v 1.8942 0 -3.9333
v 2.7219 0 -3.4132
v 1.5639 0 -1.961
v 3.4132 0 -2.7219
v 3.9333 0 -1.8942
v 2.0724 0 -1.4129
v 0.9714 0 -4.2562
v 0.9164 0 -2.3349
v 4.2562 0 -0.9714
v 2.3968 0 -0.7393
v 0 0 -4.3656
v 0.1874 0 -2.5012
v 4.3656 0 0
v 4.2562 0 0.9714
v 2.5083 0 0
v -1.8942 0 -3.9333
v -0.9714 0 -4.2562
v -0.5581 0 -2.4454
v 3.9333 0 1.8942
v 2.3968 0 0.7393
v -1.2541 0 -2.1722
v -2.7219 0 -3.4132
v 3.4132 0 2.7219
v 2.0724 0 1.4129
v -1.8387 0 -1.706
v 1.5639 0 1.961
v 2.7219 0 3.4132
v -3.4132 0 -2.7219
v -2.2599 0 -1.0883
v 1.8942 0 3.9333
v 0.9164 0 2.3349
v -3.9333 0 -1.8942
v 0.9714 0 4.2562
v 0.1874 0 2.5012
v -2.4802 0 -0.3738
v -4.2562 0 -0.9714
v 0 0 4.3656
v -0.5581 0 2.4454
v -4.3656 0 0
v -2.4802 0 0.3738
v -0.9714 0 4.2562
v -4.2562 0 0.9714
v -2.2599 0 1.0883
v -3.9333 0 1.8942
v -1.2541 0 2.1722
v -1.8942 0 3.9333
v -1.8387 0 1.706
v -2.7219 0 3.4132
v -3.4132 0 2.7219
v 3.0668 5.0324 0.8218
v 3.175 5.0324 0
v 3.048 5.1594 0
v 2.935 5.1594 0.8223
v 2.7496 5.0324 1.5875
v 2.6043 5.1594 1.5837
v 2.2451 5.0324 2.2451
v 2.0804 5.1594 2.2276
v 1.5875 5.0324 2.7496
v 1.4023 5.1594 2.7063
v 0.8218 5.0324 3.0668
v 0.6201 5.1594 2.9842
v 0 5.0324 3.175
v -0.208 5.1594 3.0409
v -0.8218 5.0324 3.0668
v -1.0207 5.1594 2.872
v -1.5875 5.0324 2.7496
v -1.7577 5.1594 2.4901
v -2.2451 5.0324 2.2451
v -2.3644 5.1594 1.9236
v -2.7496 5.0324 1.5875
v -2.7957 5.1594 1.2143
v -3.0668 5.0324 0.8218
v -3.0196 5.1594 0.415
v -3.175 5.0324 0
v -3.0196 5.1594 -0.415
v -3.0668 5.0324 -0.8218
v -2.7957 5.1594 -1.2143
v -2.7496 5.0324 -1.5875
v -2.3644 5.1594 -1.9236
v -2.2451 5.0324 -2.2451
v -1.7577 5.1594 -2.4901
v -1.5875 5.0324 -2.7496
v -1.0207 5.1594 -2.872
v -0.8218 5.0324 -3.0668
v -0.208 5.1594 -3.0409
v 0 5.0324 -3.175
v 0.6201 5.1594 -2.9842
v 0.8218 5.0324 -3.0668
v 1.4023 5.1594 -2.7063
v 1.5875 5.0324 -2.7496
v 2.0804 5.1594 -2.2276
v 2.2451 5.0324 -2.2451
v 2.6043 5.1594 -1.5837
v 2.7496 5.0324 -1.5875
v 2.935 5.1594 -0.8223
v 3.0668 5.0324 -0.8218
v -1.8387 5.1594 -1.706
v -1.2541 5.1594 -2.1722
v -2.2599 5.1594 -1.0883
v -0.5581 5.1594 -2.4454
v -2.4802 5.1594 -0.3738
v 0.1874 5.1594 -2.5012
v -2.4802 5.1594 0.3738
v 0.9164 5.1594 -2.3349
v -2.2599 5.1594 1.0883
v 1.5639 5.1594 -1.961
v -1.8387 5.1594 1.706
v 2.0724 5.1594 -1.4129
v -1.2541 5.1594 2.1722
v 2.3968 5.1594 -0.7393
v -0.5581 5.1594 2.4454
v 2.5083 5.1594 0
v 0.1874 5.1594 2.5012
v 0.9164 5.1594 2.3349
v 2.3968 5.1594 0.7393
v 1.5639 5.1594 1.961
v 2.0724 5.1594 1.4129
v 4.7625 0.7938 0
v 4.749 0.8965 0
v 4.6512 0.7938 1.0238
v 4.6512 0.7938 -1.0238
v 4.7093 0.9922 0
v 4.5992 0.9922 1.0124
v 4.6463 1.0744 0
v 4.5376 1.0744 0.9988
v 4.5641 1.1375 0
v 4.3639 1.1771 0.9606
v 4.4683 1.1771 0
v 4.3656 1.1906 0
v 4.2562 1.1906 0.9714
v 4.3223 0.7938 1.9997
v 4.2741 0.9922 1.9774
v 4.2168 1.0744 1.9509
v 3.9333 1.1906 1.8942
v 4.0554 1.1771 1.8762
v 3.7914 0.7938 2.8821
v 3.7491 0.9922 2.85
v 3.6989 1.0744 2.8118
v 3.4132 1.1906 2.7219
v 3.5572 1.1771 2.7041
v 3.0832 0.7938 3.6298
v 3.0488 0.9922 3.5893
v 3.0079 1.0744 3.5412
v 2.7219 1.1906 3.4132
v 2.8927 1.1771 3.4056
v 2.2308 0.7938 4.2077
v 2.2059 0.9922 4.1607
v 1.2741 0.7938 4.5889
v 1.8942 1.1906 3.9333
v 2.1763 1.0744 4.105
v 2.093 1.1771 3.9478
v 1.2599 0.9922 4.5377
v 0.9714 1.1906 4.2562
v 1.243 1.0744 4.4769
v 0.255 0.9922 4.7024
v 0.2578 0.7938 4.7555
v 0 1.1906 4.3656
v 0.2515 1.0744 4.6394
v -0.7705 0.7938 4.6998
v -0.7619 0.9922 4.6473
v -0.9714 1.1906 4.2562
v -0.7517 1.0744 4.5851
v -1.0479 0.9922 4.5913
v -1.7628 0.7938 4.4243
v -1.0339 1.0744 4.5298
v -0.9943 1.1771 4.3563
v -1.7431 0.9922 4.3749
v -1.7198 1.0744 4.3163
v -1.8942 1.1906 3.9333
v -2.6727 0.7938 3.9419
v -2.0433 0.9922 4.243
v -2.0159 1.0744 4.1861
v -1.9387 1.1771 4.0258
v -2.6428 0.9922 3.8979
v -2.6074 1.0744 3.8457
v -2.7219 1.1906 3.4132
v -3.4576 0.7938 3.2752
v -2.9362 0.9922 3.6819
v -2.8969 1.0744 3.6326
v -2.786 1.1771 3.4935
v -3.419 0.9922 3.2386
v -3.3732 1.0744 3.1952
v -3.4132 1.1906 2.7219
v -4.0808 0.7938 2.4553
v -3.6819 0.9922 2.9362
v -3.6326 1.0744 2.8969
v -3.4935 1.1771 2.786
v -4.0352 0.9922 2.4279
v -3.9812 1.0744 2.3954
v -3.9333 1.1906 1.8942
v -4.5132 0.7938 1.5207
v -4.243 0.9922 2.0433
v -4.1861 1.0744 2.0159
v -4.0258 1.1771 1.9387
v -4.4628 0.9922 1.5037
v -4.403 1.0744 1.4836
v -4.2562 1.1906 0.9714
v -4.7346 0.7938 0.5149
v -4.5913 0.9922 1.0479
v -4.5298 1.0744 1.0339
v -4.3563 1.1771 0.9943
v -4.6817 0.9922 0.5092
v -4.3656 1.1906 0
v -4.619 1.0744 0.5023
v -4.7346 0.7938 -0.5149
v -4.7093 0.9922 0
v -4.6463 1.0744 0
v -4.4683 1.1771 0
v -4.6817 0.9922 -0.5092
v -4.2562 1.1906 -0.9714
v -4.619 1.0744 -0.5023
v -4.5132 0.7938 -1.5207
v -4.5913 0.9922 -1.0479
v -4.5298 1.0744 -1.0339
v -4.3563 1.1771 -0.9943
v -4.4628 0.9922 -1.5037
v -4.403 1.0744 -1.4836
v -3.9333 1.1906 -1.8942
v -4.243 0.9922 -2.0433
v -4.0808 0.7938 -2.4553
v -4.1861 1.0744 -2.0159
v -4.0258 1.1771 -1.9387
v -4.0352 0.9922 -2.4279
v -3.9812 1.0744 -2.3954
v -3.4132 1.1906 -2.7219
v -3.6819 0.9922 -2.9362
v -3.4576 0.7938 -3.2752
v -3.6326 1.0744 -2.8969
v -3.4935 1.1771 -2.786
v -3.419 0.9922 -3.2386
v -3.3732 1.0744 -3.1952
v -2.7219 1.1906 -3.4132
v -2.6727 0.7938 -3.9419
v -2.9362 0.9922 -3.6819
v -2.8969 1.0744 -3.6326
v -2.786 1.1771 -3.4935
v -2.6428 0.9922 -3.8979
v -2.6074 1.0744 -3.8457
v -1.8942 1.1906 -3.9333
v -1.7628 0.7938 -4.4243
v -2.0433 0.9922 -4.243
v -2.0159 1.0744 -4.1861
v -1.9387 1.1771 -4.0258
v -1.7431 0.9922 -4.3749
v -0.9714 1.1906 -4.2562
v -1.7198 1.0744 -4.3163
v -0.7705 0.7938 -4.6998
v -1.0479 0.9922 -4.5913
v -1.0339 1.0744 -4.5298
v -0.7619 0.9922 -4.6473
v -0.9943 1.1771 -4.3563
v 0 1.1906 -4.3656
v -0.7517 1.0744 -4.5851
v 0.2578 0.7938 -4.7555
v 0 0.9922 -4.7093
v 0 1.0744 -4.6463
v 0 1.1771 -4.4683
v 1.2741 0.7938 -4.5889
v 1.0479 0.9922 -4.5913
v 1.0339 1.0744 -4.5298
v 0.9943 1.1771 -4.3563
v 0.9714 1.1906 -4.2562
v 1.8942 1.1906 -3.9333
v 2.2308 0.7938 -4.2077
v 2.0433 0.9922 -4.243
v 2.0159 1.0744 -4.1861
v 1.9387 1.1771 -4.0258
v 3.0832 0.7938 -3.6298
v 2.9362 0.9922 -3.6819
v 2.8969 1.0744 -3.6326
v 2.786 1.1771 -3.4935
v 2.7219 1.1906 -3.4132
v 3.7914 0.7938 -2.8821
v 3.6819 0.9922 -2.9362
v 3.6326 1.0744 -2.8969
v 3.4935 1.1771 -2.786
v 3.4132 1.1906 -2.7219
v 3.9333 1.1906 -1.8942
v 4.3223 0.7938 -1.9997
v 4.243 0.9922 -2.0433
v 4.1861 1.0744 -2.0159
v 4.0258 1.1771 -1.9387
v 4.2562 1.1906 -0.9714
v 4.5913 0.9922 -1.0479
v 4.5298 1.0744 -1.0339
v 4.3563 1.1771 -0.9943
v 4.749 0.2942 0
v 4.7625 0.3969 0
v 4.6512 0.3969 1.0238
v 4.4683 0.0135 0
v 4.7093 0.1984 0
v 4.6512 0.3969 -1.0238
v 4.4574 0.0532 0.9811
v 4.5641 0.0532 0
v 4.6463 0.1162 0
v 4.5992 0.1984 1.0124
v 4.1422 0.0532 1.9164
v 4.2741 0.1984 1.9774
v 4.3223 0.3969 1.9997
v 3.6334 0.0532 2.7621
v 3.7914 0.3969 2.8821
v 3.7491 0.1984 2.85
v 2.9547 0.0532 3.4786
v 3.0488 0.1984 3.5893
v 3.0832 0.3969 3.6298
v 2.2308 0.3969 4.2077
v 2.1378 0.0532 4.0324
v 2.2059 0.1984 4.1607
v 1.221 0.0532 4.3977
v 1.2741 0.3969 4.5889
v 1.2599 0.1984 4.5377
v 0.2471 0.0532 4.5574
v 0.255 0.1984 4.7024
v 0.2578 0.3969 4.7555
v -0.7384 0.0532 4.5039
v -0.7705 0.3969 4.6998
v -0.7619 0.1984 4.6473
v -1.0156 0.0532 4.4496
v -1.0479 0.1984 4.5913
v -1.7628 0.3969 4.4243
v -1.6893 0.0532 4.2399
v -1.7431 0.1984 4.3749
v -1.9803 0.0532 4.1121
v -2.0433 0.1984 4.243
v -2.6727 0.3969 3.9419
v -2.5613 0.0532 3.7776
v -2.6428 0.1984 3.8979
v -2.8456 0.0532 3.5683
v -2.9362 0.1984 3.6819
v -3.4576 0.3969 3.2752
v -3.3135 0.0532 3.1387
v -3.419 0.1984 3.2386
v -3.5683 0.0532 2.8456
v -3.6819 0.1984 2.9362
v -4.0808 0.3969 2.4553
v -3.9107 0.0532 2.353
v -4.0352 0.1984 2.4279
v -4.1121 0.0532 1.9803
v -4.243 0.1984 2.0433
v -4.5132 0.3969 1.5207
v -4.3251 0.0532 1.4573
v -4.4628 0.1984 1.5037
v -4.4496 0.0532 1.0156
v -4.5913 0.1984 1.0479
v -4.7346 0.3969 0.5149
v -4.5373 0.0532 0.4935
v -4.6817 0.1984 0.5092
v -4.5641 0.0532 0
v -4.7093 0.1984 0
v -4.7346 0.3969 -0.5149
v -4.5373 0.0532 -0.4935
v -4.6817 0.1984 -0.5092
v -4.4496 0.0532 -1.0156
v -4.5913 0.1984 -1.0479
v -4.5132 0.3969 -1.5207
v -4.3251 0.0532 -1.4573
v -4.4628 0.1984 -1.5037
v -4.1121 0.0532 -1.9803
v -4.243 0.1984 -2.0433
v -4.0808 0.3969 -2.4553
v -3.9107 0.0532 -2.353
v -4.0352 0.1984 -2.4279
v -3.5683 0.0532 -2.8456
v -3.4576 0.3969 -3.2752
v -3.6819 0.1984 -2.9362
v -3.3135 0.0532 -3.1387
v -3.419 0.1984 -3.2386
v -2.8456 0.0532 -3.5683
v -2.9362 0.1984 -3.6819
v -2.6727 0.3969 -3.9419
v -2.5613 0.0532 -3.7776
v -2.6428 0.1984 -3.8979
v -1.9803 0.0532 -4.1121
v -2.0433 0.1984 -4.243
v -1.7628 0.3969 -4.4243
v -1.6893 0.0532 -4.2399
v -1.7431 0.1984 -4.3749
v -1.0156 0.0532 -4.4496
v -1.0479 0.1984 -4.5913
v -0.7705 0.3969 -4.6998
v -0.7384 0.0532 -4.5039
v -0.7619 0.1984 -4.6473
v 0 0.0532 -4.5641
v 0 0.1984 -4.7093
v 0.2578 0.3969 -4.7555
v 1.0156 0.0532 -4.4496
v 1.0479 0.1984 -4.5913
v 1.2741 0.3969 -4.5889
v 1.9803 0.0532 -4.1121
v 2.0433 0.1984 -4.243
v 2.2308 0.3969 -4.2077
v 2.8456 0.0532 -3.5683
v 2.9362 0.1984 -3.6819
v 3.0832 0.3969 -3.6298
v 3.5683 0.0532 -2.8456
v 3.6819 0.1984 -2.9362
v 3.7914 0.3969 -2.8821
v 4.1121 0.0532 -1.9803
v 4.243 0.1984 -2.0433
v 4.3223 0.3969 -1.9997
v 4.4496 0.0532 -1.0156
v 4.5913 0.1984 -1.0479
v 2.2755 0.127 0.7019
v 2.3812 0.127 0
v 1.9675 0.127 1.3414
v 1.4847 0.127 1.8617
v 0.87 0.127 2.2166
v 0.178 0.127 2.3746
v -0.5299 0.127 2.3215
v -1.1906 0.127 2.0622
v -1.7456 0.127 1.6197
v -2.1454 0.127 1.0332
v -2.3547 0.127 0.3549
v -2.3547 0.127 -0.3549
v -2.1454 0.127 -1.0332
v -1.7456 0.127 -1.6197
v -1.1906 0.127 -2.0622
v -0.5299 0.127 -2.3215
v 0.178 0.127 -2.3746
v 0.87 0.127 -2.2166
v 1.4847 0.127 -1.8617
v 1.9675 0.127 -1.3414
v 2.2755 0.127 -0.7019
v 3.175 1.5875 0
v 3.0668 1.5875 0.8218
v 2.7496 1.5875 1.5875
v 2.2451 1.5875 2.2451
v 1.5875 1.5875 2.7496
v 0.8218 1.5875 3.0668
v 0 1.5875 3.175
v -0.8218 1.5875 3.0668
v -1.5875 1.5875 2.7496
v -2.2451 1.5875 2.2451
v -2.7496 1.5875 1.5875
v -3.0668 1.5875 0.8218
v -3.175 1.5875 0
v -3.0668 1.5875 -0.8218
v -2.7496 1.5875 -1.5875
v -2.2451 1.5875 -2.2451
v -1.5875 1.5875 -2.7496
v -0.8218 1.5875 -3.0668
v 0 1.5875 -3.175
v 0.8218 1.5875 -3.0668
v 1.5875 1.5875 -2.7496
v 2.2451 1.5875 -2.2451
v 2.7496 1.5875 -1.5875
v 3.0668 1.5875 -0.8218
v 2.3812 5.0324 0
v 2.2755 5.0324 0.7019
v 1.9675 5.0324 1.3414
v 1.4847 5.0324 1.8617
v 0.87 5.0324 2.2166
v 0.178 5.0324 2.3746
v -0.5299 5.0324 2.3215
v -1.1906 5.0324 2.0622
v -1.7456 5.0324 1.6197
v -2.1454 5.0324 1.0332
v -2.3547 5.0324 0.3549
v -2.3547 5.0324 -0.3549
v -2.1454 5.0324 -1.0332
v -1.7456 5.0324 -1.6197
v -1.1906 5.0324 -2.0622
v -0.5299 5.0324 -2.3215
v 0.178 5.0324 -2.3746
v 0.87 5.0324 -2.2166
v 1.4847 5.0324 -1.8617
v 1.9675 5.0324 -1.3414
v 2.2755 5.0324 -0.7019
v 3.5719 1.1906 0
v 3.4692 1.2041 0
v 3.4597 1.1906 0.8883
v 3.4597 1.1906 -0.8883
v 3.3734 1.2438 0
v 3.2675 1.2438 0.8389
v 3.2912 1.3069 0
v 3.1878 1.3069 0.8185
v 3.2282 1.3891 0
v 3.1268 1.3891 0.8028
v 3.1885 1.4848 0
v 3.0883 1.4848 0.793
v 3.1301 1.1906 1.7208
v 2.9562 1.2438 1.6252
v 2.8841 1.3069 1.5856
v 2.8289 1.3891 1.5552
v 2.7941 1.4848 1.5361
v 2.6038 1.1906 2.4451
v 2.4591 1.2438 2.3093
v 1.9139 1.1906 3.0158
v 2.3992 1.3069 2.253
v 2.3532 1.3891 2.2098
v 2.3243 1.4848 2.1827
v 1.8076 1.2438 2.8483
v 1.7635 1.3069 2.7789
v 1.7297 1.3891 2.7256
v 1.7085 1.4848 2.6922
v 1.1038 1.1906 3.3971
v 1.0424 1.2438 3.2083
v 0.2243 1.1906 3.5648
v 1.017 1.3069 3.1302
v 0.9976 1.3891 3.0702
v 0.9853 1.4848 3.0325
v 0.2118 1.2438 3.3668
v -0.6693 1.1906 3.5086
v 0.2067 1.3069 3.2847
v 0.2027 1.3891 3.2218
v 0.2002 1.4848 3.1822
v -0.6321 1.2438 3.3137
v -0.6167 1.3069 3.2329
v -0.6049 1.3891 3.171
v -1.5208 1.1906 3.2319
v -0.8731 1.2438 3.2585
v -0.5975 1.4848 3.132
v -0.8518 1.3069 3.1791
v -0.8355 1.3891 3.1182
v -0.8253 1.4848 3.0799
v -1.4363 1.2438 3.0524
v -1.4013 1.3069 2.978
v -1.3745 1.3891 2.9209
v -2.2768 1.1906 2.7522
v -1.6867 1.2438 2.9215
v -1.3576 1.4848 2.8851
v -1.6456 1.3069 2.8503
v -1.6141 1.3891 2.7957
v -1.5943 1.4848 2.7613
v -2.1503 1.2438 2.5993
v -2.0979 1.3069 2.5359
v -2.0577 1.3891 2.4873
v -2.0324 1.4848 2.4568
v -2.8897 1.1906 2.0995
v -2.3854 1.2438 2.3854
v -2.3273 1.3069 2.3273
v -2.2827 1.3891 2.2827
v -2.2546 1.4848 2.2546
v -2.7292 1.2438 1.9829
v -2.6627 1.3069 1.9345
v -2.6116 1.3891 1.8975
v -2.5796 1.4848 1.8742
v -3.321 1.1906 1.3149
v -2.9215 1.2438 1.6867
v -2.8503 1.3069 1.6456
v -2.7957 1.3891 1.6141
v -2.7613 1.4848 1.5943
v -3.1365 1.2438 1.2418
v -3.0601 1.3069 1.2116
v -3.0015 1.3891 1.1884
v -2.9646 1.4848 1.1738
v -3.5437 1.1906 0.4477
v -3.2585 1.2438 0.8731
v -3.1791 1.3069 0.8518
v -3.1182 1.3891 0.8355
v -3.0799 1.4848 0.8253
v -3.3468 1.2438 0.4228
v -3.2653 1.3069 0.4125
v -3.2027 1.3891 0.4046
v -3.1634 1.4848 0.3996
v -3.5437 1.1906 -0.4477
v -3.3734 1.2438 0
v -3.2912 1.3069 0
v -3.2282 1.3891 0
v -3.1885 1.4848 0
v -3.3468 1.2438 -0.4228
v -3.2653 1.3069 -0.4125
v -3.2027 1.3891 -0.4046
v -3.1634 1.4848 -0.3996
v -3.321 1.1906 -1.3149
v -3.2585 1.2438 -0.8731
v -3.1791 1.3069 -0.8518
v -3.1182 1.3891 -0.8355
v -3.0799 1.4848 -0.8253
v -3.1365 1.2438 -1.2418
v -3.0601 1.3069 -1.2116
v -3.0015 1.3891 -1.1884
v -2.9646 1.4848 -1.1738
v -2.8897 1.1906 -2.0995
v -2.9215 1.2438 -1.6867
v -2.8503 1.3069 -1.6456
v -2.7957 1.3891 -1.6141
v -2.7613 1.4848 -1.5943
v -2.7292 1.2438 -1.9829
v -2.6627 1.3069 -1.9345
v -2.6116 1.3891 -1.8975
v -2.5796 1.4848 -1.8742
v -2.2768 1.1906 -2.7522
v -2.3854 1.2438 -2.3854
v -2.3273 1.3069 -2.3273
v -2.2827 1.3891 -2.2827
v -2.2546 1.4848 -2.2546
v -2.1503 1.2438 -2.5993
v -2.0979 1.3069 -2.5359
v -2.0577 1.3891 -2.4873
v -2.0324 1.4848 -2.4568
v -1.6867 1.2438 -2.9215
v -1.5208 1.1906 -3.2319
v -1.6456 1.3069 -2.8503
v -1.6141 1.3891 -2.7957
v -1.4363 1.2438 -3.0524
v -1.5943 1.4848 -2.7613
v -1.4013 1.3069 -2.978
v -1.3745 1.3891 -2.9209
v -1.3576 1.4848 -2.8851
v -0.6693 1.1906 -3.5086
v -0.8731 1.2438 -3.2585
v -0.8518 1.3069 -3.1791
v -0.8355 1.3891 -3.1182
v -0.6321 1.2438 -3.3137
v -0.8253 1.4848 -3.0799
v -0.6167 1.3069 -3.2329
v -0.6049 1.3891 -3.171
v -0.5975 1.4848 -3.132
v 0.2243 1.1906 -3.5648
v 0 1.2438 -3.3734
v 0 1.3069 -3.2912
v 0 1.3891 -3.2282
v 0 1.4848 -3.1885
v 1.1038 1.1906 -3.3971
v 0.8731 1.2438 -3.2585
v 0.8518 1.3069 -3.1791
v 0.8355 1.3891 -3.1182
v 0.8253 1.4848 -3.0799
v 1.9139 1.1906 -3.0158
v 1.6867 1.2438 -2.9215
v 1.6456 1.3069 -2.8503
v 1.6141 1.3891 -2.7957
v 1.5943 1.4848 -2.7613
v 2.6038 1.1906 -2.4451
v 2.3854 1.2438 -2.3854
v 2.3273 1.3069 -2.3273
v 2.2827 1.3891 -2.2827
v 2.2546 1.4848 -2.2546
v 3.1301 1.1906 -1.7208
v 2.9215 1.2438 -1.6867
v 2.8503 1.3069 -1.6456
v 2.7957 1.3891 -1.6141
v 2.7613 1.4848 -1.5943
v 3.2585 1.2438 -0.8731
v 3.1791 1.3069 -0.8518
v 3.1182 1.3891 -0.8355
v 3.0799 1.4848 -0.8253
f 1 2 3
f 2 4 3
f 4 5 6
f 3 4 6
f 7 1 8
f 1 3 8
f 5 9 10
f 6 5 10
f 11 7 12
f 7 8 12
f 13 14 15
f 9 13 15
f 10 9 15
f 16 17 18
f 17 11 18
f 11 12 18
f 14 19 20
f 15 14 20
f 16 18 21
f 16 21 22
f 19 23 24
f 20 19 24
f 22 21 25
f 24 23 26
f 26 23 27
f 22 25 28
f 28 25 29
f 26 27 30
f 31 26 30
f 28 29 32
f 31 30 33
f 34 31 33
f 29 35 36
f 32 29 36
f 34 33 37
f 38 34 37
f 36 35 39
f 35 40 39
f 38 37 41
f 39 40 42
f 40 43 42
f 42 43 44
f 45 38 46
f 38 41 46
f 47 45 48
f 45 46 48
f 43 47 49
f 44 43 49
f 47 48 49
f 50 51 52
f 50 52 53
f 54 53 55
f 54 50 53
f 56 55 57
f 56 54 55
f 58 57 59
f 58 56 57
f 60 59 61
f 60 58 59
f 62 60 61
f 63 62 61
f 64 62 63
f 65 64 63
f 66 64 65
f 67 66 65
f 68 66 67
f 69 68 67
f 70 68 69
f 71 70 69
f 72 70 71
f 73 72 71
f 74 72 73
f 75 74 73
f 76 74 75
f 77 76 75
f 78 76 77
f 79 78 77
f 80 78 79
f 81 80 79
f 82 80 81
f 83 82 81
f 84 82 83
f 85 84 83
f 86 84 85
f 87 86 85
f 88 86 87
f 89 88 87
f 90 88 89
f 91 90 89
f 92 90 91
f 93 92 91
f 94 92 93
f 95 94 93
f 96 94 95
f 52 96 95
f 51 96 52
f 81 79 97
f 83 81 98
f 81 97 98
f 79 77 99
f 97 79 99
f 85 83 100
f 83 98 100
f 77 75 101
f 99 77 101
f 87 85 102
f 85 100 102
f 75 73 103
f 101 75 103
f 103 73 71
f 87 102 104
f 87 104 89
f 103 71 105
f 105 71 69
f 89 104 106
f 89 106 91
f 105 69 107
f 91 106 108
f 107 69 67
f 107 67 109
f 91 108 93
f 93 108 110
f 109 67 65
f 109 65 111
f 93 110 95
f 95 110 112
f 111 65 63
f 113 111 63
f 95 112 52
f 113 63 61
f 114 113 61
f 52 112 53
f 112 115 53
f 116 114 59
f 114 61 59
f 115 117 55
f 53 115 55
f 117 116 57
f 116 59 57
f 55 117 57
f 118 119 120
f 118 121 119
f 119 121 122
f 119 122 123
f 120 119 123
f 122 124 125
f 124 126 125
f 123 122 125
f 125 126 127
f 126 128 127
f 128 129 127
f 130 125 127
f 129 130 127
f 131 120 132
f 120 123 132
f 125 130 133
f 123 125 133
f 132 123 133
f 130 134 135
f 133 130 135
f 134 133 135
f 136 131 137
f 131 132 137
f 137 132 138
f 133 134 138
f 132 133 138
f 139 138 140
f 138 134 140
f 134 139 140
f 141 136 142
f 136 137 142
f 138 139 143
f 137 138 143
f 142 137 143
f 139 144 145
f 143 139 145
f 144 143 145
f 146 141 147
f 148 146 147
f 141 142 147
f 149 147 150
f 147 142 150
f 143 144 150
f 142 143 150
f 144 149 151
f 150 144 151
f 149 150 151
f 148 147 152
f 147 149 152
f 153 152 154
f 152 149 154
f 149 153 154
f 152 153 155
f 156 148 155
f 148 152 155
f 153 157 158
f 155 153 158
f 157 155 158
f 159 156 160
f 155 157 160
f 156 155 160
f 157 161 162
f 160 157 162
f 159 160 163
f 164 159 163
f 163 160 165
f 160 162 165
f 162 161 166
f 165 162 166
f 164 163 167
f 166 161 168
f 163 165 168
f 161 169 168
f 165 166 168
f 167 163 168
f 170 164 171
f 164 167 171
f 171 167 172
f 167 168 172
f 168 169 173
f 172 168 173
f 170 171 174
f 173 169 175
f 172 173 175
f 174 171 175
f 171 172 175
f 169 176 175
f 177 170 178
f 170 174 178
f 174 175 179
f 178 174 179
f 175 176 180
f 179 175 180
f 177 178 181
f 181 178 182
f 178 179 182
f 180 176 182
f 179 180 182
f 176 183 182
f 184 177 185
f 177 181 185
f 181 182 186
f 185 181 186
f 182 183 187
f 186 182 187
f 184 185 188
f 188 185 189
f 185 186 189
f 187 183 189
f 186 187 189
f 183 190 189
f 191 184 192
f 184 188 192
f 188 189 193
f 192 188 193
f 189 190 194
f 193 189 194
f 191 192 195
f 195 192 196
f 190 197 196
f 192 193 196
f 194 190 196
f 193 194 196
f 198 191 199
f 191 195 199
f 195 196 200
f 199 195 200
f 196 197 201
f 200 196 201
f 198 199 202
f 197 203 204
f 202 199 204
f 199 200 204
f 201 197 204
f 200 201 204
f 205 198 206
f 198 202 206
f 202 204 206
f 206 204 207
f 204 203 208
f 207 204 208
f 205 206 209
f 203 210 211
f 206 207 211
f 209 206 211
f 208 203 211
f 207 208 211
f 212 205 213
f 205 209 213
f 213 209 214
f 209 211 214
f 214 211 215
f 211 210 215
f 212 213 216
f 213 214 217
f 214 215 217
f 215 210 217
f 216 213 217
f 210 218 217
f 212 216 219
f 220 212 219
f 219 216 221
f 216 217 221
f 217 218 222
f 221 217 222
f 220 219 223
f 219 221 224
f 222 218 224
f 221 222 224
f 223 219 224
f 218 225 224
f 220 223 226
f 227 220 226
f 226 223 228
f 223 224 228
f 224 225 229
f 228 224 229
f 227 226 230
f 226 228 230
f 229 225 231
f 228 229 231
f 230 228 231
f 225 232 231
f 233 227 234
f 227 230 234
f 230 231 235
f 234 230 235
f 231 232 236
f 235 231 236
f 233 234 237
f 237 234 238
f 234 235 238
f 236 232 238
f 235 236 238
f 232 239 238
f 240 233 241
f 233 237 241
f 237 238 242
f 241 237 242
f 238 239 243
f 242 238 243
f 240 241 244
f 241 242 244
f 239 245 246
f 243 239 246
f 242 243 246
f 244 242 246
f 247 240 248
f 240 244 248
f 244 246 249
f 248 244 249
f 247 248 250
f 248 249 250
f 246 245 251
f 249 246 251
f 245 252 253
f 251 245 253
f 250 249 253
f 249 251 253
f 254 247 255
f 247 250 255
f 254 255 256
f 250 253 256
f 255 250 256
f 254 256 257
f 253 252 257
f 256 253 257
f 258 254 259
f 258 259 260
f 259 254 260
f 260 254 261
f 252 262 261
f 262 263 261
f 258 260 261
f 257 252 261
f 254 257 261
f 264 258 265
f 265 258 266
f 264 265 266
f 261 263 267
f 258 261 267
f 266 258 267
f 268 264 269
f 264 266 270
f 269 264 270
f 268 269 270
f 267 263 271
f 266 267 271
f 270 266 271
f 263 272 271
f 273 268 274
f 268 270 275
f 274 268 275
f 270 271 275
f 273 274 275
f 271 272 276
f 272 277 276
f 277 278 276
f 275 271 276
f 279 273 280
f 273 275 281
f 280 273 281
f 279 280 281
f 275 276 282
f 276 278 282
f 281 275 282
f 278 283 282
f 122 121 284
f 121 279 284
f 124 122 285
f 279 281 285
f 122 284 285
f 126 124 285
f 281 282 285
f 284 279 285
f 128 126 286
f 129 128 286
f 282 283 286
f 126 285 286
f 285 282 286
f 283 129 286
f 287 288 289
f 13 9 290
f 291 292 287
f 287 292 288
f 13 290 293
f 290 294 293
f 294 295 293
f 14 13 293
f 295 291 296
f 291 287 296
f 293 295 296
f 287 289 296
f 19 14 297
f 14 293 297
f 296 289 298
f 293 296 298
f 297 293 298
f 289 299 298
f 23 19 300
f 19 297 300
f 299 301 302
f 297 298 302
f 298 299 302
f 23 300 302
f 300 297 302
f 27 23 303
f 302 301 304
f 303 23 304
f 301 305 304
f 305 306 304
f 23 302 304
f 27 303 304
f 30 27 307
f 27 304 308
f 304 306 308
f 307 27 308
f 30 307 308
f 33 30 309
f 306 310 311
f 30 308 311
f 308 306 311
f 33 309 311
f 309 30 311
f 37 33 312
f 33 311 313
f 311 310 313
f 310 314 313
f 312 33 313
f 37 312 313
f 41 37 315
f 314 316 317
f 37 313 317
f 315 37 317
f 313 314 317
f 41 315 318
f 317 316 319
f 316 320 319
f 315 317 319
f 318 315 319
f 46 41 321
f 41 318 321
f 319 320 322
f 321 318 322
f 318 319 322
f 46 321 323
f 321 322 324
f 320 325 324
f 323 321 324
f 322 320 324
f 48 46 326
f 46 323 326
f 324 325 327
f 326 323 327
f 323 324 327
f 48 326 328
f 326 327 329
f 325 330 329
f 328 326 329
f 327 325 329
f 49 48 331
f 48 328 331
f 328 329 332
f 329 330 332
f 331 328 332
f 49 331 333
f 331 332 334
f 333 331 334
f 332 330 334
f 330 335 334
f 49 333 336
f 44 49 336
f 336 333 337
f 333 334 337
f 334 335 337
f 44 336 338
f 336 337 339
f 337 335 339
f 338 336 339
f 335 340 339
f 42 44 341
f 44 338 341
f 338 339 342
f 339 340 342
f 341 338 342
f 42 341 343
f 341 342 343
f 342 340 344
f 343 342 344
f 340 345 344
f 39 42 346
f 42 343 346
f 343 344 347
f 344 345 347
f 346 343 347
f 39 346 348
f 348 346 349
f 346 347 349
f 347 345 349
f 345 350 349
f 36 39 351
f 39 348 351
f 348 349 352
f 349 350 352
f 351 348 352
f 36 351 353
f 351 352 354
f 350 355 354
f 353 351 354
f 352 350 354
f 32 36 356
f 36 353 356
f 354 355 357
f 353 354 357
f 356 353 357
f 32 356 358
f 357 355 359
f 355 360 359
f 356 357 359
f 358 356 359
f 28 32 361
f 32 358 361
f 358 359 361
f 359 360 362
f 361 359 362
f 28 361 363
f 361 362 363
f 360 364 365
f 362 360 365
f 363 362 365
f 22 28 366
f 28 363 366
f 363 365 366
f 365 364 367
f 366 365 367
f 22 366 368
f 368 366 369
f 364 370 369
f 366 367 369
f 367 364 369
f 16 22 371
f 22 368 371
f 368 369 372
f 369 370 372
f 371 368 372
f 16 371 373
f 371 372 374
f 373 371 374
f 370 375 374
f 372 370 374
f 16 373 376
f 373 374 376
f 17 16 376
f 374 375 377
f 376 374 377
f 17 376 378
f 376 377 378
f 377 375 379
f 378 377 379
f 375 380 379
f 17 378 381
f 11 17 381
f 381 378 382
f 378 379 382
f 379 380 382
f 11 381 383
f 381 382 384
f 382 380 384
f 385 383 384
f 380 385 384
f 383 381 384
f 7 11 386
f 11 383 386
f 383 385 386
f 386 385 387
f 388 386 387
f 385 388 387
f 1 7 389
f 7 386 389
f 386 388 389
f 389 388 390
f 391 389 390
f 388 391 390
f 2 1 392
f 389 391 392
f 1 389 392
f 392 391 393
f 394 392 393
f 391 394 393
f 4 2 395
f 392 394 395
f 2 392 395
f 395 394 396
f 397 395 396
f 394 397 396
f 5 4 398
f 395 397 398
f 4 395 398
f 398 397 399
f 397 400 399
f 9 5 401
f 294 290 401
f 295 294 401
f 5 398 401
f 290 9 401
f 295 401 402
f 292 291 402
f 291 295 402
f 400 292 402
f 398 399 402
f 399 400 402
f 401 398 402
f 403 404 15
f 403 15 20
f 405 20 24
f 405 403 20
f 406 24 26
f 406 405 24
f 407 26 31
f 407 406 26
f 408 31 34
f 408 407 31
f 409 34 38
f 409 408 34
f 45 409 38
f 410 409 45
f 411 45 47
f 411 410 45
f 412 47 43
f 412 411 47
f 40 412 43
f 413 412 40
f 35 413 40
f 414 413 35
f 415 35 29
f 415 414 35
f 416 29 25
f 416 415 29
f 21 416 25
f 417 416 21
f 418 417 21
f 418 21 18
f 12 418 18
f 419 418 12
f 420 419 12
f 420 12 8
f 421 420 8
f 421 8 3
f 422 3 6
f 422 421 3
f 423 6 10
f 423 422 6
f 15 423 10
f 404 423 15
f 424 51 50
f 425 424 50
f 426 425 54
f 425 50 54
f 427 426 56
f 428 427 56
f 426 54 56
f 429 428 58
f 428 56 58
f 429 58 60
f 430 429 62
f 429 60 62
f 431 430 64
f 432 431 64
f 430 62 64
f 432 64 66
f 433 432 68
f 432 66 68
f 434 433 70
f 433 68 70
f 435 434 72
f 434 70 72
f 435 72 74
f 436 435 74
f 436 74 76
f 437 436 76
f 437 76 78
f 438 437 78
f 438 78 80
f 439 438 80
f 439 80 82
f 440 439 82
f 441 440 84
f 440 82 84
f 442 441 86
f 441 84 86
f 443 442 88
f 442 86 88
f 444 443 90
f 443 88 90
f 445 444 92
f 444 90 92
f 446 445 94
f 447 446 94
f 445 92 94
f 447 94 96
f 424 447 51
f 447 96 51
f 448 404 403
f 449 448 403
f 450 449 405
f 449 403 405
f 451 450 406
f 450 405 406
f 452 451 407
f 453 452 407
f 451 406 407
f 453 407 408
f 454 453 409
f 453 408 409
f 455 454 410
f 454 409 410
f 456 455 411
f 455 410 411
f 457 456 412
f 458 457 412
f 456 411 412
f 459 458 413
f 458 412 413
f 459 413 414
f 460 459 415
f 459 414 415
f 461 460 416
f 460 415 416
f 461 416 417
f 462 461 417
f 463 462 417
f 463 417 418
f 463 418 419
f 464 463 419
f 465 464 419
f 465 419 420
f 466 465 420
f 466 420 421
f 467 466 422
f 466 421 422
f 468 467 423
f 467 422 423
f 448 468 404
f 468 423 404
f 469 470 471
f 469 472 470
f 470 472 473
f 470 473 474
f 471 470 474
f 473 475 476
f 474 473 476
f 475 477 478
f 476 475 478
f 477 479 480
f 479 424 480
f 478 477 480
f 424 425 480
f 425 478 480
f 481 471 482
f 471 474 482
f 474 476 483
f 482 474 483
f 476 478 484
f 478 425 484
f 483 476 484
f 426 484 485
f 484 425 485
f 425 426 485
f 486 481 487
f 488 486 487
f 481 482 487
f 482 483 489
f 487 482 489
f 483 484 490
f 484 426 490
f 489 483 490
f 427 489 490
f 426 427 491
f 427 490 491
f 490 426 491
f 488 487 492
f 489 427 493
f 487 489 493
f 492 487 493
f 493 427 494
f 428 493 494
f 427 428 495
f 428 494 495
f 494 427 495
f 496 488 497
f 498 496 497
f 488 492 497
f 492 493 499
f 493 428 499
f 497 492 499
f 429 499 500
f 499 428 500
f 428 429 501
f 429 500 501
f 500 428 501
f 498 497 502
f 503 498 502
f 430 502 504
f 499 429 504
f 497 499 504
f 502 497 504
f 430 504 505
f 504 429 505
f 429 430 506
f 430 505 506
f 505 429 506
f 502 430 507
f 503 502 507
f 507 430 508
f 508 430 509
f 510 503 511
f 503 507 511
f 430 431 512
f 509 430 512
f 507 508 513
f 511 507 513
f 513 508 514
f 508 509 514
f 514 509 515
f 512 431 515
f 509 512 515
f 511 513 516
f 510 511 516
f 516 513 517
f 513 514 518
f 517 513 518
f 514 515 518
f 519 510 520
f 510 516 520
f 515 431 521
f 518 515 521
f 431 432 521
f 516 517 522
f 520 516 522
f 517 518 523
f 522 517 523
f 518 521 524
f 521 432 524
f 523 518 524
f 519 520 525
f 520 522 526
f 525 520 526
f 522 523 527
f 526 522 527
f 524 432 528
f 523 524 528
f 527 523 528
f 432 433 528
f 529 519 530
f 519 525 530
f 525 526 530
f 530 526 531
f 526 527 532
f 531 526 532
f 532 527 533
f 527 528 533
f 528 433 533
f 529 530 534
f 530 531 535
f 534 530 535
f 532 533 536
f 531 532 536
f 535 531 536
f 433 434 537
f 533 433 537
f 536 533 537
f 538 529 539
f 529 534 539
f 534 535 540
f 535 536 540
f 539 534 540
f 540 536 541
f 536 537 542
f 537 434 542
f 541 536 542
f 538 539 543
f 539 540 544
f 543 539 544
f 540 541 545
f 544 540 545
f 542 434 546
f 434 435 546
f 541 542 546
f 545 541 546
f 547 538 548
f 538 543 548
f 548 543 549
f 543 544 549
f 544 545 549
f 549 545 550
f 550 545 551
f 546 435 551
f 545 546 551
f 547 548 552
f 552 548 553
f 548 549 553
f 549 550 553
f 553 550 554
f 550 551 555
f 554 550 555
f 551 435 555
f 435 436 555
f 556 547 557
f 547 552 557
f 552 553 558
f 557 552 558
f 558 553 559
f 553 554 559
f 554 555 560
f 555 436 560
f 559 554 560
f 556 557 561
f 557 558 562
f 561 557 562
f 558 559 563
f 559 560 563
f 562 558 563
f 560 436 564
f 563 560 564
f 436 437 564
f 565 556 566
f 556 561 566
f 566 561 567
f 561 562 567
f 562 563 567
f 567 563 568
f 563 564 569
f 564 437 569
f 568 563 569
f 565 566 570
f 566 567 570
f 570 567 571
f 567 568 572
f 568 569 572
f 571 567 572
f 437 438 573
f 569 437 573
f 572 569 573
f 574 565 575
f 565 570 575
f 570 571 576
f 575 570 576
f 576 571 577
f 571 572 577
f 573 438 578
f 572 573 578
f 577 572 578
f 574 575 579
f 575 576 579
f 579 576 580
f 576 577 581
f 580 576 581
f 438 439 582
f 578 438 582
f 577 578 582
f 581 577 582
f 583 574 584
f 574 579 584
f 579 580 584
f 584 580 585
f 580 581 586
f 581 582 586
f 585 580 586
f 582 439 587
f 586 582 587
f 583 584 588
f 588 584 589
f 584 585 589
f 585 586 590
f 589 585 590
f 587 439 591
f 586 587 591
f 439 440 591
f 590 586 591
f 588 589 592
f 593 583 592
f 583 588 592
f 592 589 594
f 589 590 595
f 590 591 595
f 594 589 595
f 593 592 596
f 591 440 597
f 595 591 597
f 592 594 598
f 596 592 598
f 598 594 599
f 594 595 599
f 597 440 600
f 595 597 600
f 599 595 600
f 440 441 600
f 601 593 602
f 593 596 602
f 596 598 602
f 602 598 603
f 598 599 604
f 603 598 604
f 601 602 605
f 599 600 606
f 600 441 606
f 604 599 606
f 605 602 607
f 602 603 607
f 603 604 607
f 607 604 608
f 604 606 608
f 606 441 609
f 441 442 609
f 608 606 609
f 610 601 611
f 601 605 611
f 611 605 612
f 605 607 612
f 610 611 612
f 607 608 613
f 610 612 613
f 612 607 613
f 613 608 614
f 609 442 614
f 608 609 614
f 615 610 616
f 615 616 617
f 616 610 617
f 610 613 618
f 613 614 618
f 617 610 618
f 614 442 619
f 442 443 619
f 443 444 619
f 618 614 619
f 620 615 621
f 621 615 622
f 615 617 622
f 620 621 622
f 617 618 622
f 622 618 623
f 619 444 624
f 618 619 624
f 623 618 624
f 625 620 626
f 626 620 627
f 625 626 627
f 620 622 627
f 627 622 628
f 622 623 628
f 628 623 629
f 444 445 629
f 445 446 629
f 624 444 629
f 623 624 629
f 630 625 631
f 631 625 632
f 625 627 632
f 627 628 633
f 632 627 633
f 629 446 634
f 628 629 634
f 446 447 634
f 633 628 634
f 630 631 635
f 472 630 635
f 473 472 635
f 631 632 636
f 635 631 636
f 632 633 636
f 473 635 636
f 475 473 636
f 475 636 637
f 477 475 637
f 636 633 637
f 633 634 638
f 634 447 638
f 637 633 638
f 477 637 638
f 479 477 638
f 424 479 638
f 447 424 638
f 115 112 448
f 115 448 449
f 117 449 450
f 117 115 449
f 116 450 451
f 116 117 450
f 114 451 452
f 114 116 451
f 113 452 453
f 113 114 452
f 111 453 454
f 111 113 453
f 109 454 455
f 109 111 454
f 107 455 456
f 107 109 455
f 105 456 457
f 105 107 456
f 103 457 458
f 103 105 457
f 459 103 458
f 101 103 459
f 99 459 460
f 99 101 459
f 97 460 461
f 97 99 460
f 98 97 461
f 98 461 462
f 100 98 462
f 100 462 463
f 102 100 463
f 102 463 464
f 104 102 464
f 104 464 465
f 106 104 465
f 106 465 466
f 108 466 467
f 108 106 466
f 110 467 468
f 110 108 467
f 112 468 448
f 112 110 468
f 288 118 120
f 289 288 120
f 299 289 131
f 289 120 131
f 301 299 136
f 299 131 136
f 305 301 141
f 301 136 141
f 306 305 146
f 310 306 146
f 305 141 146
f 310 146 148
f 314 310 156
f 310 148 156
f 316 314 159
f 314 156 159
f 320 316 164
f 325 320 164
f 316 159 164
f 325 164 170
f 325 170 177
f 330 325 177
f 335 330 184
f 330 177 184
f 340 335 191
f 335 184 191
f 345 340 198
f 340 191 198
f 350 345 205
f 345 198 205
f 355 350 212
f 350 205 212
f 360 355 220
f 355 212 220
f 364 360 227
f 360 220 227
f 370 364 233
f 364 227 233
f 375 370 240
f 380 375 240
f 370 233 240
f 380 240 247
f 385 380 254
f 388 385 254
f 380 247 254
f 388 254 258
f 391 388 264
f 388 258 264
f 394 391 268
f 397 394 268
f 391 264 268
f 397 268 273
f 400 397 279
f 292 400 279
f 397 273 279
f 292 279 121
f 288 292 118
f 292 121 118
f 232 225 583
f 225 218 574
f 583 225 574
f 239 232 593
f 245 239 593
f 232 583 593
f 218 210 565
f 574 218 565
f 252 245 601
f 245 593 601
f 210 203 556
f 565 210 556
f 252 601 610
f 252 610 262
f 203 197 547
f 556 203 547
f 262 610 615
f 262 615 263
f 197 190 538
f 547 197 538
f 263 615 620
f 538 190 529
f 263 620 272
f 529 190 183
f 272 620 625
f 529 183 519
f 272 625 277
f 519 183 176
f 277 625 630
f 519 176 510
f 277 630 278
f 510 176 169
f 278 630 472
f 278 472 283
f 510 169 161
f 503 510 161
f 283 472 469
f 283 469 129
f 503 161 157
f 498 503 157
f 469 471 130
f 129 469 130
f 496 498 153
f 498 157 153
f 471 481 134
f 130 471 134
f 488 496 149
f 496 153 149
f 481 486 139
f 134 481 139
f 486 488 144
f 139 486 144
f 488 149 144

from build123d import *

# Parameters (mm, degrees)
FILLET1_R     = 0.396875
CHAMFER1_SIZE = 0.127


with BuildPart() as part:
    # Sketch1 → Revolve1 (revolve)
    with BuildSketch(Plane.XY):
        Polygon((2.38125, 0), (4.7625, 0), (4.7625, 1.190625), (3.175, 1.190625), (3.175, 5.159375), (2.38125, 5.159375), align=None)
    revolve(axis=Axis((0, 1.896667818, 0), (0, -1, 0)))

    # Fillet1
    fillet1_edges = [part.edges().sort_by_distance(p)[0] for p in [
        (-3.175, 1.190625, 0),
        (-4.7625, 1.190625, 0),
        (-4.7625, 0, 0),
    ]]
    fillet(fillet1_edges, radius=FILLET1_R)

    # Chamfer1
    chamfer1_edges = [part.edges().sort_by_distance(p)[0] for p in [
        (-2.38125, 5.159375, 0),
        (-3.175, 5.159375, 0),
        (-2.38125, 0, 0),
    ]]
    chamfer(chamfer1_edges, length=CHAMFER1_SIZE)


solid = part.part
